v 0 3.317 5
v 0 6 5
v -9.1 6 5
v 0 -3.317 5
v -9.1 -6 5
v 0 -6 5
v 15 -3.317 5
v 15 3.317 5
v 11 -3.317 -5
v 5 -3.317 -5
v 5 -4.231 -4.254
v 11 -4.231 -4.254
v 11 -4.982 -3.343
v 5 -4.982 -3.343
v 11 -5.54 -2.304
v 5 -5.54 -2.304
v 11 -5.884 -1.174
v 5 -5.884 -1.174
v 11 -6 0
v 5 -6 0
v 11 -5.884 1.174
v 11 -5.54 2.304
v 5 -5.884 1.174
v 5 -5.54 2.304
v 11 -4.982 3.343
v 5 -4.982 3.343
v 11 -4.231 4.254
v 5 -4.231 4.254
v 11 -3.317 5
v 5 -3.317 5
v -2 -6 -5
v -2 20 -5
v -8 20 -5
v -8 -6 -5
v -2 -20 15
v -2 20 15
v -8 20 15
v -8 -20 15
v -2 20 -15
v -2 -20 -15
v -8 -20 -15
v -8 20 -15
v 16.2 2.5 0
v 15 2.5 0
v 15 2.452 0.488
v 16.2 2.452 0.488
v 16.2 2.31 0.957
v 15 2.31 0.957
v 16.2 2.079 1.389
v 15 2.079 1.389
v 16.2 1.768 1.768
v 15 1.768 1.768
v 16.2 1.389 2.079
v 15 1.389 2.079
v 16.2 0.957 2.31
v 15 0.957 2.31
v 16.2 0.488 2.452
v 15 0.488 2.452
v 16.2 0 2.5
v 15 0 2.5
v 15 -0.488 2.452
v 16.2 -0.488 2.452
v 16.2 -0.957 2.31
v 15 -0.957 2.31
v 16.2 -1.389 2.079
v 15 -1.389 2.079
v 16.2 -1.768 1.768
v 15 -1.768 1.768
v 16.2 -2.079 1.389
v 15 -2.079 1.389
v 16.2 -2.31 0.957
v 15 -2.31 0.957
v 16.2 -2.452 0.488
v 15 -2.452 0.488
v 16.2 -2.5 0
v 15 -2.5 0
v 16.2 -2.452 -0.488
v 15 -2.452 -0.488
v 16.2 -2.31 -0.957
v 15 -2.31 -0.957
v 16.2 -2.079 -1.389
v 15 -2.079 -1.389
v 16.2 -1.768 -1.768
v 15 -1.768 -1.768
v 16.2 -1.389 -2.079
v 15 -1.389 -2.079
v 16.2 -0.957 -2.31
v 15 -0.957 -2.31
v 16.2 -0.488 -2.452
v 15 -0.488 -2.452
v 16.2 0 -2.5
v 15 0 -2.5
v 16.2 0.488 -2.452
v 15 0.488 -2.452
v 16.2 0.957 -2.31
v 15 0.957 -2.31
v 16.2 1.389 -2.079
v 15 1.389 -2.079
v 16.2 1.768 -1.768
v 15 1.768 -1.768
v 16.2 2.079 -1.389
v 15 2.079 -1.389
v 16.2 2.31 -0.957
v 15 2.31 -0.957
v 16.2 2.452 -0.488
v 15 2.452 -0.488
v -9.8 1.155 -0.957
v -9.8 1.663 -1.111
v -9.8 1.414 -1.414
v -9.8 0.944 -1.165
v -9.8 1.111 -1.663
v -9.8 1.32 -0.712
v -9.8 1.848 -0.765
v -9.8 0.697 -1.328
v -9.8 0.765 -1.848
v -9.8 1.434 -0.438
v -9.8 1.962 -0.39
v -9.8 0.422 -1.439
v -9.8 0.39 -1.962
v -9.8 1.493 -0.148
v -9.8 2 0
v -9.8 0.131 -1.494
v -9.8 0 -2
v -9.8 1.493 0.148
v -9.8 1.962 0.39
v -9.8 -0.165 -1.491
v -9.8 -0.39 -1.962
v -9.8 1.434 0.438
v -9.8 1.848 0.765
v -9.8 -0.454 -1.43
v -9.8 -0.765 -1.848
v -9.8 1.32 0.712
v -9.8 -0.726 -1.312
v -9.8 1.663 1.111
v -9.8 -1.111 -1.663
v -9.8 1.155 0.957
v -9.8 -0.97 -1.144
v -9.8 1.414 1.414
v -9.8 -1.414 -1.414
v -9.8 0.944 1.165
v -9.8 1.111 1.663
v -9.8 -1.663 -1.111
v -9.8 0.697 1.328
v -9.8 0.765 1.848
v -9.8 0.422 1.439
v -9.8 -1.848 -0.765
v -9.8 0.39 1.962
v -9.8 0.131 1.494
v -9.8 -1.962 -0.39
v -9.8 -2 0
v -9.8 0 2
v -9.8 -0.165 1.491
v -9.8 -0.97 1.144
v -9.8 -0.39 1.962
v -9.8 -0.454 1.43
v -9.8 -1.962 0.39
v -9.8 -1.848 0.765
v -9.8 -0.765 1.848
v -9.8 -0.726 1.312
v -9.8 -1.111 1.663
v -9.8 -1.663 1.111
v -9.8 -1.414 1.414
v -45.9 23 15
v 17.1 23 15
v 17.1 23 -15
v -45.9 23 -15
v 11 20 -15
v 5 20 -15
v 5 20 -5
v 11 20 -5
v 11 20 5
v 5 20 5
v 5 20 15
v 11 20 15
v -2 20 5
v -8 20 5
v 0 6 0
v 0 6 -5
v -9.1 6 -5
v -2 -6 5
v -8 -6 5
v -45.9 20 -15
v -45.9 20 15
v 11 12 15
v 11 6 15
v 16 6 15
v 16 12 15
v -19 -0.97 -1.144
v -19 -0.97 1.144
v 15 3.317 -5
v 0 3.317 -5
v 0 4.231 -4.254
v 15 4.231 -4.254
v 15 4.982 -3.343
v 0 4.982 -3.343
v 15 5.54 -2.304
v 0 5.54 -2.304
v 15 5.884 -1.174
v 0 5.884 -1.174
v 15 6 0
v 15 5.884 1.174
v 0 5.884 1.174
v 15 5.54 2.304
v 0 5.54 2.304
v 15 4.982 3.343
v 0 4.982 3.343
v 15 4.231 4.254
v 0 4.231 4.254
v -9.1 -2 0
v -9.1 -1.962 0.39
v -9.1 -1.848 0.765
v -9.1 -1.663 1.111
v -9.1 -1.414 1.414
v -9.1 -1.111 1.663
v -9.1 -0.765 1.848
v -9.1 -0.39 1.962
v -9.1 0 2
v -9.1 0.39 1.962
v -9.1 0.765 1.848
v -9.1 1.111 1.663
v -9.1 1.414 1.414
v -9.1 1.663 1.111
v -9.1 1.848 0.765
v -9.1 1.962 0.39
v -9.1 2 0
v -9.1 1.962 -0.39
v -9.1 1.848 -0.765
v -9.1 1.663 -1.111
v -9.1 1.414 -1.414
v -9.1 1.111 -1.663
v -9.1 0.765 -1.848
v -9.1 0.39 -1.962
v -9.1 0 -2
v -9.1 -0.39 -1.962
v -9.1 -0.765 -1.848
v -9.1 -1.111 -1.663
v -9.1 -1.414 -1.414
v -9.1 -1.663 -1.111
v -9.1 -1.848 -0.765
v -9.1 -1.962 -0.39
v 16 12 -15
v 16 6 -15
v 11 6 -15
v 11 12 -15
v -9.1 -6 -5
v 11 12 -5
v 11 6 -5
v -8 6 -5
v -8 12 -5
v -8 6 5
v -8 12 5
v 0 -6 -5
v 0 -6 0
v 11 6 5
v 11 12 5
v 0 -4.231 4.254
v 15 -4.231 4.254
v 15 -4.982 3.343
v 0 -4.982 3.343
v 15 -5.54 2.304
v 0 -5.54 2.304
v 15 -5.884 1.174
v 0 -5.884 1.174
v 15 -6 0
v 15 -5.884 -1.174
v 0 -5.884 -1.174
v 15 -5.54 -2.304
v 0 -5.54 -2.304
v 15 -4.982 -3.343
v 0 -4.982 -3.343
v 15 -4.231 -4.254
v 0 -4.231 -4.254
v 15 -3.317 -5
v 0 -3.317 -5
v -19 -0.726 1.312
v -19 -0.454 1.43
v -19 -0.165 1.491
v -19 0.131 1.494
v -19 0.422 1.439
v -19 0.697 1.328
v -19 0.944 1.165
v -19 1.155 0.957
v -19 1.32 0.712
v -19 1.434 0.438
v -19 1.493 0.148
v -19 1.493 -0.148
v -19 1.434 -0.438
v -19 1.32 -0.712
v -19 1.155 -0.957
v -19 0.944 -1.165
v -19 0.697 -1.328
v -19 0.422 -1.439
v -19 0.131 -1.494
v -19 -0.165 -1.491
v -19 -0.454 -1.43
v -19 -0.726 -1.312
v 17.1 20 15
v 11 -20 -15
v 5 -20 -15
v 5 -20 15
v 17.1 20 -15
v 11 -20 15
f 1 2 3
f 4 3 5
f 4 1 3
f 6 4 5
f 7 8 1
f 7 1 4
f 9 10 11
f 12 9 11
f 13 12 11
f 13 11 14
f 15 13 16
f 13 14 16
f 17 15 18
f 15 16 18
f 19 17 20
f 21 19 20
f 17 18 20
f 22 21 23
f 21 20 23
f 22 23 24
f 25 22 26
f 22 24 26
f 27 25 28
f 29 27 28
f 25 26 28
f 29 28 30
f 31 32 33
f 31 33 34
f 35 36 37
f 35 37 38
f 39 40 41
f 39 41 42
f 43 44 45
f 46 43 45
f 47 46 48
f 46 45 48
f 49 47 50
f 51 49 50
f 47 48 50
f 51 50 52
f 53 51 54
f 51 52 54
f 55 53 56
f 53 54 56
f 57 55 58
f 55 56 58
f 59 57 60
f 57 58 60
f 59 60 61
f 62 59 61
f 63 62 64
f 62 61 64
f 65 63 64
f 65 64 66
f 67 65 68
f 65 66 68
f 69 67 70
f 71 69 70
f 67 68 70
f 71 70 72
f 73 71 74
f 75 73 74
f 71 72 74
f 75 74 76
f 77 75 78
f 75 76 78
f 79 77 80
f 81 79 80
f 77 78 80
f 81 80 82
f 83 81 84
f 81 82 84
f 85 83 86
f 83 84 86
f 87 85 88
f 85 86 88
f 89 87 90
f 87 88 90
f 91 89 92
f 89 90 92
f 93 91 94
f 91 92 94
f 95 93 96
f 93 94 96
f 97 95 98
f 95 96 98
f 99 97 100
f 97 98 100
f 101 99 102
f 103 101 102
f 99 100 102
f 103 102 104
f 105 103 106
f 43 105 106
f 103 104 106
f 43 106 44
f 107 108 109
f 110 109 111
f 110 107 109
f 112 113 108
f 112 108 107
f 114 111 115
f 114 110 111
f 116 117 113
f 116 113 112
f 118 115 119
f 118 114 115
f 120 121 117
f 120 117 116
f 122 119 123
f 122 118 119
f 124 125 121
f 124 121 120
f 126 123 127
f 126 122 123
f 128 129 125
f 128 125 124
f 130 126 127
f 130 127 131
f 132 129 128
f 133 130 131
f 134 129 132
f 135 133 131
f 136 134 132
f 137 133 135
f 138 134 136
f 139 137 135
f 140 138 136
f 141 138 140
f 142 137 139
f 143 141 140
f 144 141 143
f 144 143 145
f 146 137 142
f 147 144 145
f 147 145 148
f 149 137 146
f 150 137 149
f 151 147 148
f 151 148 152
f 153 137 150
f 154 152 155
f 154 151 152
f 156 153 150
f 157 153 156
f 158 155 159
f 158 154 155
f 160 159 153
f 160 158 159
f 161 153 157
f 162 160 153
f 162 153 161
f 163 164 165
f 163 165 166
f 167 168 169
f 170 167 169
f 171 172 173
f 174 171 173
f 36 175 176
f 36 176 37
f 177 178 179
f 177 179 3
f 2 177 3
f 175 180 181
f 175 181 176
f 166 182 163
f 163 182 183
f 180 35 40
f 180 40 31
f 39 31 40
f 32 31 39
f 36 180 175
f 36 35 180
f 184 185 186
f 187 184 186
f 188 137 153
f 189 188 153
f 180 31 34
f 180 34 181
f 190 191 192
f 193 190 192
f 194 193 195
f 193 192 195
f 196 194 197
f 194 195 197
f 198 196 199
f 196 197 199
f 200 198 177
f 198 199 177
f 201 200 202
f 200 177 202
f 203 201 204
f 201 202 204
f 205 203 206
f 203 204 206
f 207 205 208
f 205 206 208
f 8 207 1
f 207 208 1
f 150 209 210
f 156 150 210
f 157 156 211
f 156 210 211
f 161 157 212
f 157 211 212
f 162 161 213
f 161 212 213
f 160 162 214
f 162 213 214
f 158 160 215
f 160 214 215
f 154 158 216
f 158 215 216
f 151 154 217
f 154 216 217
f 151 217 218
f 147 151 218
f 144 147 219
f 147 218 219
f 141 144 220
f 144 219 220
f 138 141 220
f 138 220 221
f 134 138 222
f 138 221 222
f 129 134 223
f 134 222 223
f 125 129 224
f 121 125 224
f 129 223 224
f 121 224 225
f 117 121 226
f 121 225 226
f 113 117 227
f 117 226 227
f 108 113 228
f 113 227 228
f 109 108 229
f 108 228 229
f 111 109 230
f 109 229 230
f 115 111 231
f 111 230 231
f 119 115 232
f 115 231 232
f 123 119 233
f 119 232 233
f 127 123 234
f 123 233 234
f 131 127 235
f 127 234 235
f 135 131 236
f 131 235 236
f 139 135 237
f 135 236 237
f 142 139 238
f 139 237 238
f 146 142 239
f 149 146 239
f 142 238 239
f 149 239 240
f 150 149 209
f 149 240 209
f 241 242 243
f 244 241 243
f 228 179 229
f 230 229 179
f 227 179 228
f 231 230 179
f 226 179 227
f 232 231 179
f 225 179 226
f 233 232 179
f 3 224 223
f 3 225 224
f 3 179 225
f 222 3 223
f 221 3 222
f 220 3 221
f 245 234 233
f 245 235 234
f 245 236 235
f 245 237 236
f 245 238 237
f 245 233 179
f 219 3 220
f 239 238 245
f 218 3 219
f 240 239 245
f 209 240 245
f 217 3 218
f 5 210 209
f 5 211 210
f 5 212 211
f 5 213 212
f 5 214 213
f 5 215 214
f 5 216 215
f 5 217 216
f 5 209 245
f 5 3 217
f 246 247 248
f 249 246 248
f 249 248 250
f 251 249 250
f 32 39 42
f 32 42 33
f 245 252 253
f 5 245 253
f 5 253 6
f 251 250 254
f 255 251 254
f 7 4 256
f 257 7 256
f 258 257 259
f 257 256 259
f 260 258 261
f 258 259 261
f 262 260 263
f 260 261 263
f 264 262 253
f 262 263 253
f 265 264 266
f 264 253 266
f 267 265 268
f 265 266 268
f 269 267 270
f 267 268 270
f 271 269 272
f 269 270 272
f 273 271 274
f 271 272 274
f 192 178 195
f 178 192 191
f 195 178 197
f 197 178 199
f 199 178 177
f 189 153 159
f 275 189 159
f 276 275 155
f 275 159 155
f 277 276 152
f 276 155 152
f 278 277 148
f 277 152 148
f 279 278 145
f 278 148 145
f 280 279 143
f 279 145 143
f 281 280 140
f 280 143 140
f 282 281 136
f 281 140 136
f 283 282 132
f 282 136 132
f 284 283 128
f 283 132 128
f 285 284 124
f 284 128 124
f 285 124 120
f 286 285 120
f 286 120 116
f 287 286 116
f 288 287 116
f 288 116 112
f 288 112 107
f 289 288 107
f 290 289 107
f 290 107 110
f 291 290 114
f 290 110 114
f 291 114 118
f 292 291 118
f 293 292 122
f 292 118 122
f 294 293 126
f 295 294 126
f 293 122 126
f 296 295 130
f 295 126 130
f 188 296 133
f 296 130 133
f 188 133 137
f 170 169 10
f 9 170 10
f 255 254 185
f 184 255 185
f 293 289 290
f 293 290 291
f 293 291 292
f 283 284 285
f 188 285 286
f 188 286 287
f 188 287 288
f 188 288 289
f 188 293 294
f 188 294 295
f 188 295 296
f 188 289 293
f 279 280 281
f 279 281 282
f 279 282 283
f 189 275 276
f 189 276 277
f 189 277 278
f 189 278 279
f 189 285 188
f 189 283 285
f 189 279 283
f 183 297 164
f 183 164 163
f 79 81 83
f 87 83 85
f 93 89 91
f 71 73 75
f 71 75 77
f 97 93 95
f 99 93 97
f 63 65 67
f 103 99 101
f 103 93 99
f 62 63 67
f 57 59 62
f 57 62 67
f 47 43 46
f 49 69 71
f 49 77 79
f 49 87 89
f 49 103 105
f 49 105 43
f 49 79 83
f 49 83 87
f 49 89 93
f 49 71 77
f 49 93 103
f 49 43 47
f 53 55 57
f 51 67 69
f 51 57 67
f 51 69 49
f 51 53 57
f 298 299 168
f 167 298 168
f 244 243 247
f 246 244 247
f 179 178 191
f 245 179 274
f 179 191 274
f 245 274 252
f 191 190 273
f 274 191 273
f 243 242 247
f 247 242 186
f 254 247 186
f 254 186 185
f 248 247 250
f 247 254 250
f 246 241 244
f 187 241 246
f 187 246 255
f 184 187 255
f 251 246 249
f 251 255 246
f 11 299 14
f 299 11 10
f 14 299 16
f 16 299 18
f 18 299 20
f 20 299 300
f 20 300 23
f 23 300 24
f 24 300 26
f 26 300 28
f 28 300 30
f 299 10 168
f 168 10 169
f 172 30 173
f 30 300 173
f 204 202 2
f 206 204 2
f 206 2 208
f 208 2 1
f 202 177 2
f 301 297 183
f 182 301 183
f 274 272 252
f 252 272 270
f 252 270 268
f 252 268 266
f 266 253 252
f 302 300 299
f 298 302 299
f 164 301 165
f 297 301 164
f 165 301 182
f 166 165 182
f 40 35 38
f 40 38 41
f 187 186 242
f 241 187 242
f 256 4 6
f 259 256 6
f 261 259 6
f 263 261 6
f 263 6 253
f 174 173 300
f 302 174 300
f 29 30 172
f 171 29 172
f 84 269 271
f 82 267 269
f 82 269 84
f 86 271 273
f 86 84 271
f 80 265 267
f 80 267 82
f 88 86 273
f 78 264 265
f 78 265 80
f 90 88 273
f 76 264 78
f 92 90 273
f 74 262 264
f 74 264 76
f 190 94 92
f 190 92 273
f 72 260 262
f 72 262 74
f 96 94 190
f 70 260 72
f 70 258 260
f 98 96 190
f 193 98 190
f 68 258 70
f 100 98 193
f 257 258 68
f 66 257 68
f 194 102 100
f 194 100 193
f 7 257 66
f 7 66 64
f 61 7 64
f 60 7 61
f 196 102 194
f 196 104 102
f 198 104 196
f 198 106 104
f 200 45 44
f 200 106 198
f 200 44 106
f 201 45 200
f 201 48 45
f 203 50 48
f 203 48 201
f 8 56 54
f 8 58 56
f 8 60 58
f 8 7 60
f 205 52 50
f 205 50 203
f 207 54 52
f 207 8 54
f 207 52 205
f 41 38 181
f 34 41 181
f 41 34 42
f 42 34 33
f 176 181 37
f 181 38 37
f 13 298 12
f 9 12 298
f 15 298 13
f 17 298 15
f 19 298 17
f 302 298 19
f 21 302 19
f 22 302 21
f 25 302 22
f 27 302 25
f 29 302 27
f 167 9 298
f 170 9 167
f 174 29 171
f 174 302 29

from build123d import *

# Parameters (mm, degrees)
F1_DEPTH  = 15
F2_R      = 2.5
F3_DEPTH  = 1.2
F4_W      = 12
F4_H      = 10
F5_DEPTH  = 9.1
F6_R      = 2
F7_DEPTH  = 0.7
F9_DEPTH  = 9.2
F12_DEPTH = 6
F13_W     = 63
F13_H     = 30
F14_DEPTH = 3
F17_DEPTH = 6
F19_DEPTH = 6


with BuildPart() as f1:
    # F0 (on Right) → F1 (new body)
    with BuildSketch(Plane.YZ):
        with BuildLine():
            Line((-3.316625, -5), (3.316625, -5))
            ThreePointArc((3.316625, -5), (6, 0), (3.316625, 5))
            Line((3.316625, 5), (-3.316625, 5))
            ThreePointArc((-3.316625, 5), (-6, 0), (-3.316625, -5))
        make_face()
    extrude(amount=F1_DEPTH)

    # F2 (on face) → F3 (join)
    with BuildSketch(Plane.YZ.offset(15)):
        Circle(F2_R)
    extrude(amount=F3_DEPTH)

    # F4 (on face) → F5 (join)
    with BuildSketch(Plane(origin=(0, 0, 0), x_dir=(0, -1, 0), z_dir=(-1, 0, 0))):
        Rectangle(F4_W, F4_H)
    extrude(amount=F5_DEPTH)

    # F6 (on face) → F7 (join)
    with BuildSketch(Plane(origin=(-9.1, 0, 0), x_dir=(0, -1, 0), z_dir=(-1, 0, 0))):
        Circle(F6_R)
    extrude(amount=F7_DEPTH)

    # F8 (on face) → F9 (join)
    with BuildSketch(Plane(origin=(-9.8, 0, 0), x_dir=(0, -1, 0), z_dir=(-1, 0, 0))):
        with BuildLine():
            Line((0.97, -1.144159), (0.97, 1.144159))
            ThreePointArc((0.97, 1.144159), (-1.5, 0), (0.97, -1.144159))
        make_face()
    extrude(amount=F9_DEPTH)


with BuildPart() as f12:
    # F11 (on offset) → F12 (new body)
    with BuildSketch(Plane.YZ.offset(5)):
        with BuildLine():
            Line((-3.316625, 5), (3.316625, 5))
            Line((3.316625, 5), (20, 5))
            Line((20, 5), (20, 15))
            Line((20, 15), (-20, 15))
            Line((-20, 15), (-20, -15))
            Line((-20, -15), (20, -15))
            Line((20, -15), (20, -5))
            Line((20, -5), (3.316625, -5))
            Line((3.316625, -5), (-3.316625, -5))
            ThreePointArc((-3.316625, -5), (-6, 0), (-3.316625, 5))
        make_face()
    extrude(amount=F12_DEPTH)


with BuildPart() as f14:
    # F13 (on face) → F14 (new body)
    with BuildSketch(Plane(origin=(0, 20, 0), x_dir=(-1, 0, 0), z_dir=(0, 1, 0))):
        with Locations((14.4, 0)):
            Rectangle(F13_W, F13_H)
    extrude(amount=F14_DEPTH)


with BuildPart() as f17:
    # F16 (on offset) → F17 (new body)
    with BuildSketch(Plane.YZ.offset(-2)):
        Polygon((20, -5), (6, -5), (-3.316625, -5), (-6, -5), (-6, 5), (-3.316625, 5), (6, 5), (20, 5), (20, 15), (-20, 15), (-20, -15), (20, -15), align=None)
    extrude(amount=-F17_DEPTH)


with BuildPart() as f19:
    # F18 (on face) → F19 (new body)
    with BuildSketch(Plane(origin=(0, 6, 0), x_dir=(-1, 0, 0), z_dir=(0, 1, 0))):
        Polygon((8, -5), (8, 5), (-11, 5), (-11, 15), (-16, 15), (-16, -15), (-11, -15), (-11, -5), align=None)
    extrude(amount=F19_DEPTH)


solid = Compound([f1.part, f12.part, f14.part, f17.part, f19.part])
